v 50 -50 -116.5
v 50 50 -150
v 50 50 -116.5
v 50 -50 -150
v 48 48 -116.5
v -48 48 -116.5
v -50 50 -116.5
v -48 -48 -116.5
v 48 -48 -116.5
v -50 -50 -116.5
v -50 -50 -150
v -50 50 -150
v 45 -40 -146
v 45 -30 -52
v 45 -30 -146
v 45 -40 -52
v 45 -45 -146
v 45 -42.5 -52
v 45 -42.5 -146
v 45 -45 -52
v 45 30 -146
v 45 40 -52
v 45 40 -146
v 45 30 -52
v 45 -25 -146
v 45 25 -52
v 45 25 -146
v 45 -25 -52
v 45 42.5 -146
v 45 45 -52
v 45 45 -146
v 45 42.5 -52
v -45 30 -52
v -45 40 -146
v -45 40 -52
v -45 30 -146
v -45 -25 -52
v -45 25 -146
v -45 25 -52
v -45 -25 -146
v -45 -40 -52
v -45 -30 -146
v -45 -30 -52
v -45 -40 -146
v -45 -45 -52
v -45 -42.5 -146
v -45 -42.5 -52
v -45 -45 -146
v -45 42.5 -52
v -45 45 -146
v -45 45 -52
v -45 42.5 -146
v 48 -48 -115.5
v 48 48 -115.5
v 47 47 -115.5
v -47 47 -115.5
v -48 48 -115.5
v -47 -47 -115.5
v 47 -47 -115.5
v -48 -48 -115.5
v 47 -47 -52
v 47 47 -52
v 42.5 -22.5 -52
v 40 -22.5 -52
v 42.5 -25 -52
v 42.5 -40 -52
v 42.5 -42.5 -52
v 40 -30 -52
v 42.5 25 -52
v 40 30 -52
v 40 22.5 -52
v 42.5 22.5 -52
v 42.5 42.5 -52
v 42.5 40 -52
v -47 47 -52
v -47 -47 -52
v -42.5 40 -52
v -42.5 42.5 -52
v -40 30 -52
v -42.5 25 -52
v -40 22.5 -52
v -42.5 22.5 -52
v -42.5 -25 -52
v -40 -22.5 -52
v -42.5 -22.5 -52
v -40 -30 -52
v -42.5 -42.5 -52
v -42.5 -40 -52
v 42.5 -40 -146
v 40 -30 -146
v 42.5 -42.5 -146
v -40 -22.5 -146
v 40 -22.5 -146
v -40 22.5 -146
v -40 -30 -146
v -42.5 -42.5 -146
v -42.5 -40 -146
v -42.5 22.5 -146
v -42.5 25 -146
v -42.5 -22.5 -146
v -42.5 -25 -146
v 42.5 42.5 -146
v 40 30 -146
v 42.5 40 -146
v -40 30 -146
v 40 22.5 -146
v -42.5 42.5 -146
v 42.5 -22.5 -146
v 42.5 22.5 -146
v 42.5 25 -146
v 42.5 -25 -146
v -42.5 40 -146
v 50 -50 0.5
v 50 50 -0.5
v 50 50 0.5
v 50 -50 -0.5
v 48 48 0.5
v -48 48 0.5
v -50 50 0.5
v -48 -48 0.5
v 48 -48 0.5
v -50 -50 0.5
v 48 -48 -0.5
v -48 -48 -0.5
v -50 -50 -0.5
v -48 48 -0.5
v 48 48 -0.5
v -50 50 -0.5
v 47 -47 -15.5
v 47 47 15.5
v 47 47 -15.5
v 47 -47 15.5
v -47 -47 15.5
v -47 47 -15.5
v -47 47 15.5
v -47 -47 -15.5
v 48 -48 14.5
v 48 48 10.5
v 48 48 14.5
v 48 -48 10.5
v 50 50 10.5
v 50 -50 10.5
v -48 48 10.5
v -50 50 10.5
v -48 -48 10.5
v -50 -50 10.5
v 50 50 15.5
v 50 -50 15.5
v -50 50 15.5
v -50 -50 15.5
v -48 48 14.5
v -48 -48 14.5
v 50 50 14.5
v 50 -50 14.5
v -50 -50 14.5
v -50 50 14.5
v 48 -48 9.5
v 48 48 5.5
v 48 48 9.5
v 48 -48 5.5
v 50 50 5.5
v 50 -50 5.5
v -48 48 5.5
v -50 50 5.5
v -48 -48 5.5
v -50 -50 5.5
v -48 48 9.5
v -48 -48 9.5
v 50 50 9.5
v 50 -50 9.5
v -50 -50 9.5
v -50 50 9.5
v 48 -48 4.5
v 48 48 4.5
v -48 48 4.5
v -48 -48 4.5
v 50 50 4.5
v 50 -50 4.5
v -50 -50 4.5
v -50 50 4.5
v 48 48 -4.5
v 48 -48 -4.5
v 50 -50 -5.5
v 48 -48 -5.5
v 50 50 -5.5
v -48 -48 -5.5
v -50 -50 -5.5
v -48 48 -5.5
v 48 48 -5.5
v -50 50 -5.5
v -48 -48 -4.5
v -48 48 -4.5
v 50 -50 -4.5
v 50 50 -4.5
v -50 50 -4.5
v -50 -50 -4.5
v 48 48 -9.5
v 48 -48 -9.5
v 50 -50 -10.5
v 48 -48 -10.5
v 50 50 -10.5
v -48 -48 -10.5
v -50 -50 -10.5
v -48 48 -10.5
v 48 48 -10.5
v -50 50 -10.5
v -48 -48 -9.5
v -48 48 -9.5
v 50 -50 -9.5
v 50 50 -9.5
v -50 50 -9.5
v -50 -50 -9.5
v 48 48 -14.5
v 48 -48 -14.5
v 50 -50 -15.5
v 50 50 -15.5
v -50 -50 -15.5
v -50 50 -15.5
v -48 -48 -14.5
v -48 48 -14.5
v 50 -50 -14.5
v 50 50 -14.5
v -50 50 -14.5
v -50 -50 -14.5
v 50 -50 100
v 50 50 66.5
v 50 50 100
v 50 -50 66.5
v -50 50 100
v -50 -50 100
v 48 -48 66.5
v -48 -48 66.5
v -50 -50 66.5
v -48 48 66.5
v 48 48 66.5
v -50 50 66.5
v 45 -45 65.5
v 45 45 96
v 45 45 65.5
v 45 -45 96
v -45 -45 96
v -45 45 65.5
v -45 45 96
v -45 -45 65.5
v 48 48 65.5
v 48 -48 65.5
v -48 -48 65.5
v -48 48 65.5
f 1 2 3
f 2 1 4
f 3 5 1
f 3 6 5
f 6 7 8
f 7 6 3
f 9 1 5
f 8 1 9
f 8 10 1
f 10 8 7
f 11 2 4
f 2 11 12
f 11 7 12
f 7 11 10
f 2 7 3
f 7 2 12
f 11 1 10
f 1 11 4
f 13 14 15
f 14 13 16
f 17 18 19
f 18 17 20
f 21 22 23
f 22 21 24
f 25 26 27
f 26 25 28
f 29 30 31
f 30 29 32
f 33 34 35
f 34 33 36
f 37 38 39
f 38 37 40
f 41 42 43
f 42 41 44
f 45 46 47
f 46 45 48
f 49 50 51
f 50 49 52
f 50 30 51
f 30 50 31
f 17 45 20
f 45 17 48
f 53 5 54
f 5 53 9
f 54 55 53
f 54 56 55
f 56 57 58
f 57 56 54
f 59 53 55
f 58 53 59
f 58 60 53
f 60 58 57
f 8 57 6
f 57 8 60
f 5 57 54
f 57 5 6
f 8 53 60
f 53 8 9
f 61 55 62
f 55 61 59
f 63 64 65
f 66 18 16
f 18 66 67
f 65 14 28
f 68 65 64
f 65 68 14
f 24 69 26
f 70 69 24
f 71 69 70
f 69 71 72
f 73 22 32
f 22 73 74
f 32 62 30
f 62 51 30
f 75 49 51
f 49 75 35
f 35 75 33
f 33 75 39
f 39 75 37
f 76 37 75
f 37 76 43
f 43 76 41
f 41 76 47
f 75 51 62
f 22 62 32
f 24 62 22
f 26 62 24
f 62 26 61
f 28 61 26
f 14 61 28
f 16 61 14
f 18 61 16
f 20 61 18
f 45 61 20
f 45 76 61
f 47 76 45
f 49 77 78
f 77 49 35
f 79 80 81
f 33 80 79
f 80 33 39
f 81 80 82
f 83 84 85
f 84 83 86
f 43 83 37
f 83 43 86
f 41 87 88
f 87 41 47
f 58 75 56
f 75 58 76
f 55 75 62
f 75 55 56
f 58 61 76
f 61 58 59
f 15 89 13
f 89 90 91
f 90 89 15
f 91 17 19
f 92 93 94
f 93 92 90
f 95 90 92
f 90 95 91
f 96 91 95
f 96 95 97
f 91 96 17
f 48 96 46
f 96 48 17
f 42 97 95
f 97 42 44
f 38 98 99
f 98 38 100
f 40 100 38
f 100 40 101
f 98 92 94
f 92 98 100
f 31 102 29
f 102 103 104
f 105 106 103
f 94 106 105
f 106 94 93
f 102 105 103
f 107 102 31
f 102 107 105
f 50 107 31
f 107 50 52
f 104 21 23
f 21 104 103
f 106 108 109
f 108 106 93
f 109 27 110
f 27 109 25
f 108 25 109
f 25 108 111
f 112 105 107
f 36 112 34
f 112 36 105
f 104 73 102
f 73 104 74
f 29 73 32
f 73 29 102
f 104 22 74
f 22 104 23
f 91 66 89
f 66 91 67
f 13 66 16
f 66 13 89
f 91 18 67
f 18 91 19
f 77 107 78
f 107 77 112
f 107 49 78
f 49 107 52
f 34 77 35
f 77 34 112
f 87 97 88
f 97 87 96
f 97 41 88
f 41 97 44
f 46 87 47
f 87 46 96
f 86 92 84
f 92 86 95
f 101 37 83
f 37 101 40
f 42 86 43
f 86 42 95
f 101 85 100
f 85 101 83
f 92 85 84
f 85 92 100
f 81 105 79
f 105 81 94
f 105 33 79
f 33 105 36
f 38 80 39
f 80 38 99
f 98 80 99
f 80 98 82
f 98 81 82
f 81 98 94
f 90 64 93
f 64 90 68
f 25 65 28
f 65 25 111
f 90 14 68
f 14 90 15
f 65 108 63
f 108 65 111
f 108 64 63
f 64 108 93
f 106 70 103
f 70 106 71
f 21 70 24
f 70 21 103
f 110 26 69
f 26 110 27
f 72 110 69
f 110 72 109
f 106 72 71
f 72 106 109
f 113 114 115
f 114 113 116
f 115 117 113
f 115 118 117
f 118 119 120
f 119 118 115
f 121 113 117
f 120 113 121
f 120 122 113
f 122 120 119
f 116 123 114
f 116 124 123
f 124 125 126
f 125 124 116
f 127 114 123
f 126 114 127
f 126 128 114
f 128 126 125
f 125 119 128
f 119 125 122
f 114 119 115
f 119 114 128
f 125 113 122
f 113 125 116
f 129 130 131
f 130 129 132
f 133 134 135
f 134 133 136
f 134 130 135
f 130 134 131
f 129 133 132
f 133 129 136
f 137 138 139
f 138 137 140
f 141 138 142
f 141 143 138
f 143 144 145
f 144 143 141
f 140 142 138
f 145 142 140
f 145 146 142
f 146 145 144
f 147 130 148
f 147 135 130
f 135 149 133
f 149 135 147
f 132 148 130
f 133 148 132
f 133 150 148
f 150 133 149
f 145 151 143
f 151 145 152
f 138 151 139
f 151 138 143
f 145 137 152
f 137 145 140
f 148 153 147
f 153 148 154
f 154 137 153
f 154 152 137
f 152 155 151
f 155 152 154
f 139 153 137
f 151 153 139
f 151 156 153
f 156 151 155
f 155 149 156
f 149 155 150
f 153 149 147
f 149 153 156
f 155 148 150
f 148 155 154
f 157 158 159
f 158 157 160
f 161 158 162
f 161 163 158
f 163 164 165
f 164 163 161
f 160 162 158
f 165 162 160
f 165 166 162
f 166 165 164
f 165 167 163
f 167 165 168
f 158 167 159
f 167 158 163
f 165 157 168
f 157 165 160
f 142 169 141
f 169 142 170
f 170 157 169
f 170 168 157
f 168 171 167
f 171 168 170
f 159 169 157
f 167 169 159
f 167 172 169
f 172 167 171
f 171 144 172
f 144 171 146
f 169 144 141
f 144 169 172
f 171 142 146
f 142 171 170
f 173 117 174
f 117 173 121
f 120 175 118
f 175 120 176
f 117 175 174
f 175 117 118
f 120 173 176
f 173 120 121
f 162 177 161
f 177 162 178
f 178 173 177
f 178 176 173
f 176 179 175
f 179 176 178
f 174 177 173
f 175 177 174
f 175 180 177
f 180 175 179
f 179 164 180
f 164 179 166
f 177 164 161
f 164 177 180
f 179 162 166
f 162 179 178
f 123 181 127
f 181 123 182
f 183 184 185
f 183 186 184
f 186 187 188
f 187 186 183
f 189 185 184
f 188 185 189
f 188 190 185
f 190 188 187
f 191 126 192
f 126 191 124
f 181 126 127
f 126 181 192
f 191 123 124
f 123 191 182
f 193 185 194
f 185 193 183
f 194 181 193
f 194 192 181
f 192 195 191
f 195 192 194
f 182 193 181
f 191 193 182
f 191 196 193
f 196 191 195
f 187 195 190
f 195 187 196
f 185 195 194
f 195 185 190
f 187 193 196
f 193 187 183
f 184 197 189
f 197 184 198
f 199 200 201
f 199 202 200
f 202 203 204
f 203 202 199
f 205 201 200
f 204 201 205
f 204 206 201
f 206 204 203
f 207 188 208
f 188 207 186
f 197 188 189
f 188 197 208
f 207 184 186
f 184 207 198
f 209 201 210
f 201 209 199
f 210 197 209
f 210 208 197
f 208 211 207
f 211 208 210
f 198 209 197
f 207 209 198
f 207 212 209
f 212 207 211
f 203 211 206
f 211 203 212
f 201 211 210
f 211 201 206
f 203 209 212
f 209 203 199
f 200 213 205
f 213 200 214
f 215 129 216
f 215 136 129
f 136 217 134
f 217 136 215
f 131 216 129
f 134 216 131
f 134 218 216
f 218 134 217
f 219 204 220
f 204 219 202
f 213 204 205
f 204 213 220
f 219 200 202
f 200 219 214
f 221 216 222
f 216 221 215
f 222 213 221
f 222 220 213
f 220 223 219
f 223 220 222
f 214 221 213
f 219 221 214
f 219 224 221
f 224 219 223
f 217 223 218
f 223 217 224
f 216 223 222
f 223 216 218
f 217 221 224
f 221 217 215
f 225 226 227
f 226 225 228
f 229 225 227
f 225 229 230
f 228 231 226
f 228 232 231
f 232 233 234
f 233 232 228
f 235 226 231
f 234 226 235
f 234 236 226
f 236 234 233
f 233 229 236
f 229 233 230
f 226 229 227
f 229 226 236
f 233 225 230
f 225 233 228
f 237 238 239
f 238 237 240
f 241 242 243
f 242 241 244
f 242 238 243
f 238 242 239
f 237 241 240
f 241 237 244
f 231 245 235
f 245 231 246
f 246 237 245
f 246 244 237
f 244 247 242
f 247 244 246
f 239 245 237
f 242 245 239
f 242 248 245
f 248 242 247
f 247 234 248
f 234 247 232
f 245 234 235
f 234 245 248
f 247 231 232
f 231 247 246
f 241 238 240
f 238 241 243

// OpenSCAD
rip_i=94;
rip_a=100;
rip_h=5;
rip_l=2;
rip_d=1;
translate([0,0,-100])

front();
cool();
translate([0,0,50])
rear();

module rear(){
    //Bodenplatte
    translate([0,0,50-2])
    cube([100,100,4],center=true);
    //
    translate([0,0,50-33.5/2])
        rahmen(100,90,33.5);
    translate([0,0,+32/2])
        rahmen(96,90,1);

    
    
}


module front(){
    //Bodenplatte
    translate([0,0,-50+2])
    cube([100,100,4],center=true);
    
    //
    translate([0,0,-50+33.5/2])
        rahmen(100,90,33.5);
    translate([0,0,-32/2])
        rahmen(96,90,1);
    rahmen(94,90,96);
    
    //rahmen halter
    translate([45-1.25,45-1.25-2.5,0])
        cube([2.5,2.5,96],center=true);
    translate([45-1.25,-45+1.25+2.5,0])
        cube([2.5,2.5,96],center=true);
    translate([-45+1.25,45-1.25-2.5,0])
        cube([2.5,2.5,96],center=true);
    translate([-45+1.25,-45+1.25+2.5,0])
        cube([2.5,2.5,96],center=true);
    
    //STREBEN
    translate([-45+2.5,-30+2.5,0])
        cube([5,5,96],center=true);
    translate([-45+3.75,-25+1.25,0])
        cube([2.5,2.5,96],center=true);
    translate([-45+2.5,+30-2.5,0])
        cube([5,5,96],center=true);
    translate([-45+3.75,+25-1.25,0])
        cube([2.5,2.5,96],center=true);
    translate([+45-2.5,-30+2.5,0])
        cube([5,5,96],center=true);
    translate([+45-3.75,-25+1.25,0])
        cube([2.5,2.5,96],center=true);
    translate([+45-2.5,+30-2.5,0])
        cube([5,5,96],center=true);
    translate([+45-3.75,+25-1.25,0])
        cube([2.5,2.5,96],center=true);
}

module cool(){
    delta=(rip_d+rip_h)/2;
translate([0,0,delta+2*rip_h])mirror([0,0,1])rip();
translate([0,0,delta+rip_h])mirror([0,0,1])rip();
translate([0,0,delta])mirror([0,0,1])rip();
rip_center();
translate([0,0,-delta])rip();
translate([0,0,-delta-rip_h])rip();
translate([0,0,-delta-2*rip_h])rip();
}

module rip_center(){
    rahmen(rip_a,rip_i,rip_d);
}

module rip(){
    rahmen(rip_a-2*rip_l,rip_i,rip_h);
     translate([0,0,(-rip_h+rip_d)/2])
        rahmen(rip_a,rip_i,rip_d);
    
}
module rahmen(aussen,innen,hoehe){
    difference(){
        cube([aussen,aussen,hoehe],center=true);
    cube([innen,innen,hoehe],center=true);
    }
}
